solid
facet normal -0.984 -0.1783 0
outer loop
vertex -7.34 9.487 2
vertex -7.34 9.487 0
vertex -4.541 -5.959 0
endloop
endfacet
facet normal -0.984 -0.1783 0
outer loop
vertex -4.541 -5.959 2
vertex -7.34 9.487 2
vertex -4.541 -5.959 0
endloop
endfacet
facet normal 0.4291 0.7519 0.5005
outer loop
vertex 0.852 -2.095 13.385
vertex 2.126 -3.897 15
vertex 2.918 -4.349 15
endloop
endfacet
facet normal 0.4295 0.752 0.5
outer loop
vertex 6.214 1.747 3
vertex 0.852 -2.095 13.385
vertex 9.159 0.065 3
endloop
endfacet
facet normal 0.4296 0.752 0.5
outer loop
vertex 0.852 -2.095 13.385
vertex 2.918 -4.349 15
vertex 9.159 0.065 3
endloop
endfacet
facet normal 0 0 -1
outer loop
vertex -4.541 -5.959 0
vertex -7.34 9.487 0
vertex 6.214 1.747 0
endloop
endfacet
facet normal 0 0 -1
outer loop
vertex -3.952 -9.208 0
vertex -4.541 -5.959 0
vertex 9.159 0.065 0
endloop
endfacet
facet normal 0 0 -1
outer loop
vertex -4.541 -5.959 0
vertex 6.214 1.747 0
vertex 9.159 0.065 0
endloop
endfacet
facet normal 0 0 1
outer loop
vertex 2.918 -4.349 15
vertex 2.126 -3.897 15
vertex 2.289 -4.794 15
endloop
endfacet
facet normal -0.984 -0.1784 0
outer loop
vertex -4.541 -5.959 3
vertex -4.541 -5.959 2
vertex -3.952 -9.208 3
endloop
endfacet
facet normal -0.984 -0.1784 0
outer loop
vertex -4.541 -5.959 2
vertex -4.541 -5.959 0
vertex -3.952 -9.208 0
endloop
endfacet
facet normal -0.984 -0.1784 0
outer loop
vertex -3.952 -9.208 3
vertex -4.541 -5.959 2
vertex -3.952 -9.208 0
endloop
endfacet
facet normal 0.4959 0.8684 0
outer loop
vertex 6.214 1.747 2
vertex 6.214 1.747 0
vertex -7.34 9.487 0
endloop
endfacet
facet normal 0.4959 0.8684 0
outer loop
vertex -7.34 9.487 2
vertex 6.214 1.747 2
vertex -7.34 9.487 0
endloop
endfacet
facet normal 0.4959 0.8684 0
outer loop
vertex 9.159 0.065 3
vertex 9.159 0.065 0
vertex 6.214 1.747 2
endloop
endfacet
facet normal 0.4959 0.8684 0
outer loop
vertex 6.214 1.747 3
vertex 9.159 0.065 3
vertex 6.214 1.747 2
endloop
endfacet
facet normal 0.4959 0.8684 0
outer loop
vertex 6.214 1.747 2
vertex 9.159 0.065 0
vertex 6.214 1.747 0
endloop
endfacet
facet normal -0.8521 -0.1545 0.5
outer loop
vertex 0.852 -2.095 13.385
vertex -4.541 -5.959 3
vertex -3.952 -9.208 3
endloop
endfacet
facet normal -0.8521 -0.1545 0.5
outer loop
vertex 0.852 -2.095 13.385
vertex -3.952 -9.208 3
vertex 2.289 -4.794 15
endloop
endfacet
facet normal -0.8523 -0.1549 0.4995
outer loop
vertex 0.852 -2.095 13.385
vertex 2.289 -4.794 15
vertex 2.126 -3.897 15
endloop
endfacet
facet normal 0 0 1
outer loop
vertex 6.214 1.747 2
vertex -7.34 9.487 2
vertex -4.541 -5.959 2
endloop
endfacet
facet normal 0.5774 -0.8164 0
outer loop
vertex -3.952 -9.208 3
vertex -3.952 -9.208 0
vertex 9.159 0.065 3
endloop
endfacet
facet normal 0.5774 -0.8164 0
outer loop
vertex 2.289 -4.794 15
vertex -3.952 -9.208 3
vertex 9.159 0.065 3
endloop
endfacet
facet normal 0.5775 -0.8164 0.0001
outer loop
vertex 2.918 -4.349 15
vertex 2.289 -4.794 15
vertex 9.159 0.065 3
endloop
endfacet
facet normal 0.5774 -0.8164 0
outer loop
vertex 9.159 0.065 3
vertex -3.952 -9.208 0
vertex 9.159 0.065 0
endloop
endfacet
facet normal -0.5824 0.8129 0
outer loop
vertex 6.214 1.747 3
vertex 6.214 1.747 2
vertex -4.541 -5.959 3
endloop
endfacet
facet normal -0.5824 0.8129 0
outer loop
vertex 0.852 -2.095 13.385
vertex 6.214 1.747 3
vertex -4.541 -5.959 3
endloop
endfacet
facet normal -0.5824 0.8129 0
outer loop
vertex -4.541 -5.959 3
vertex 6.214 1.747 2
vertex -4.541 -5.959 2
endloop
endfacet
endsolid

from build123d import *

# Parameters (mm, degrees)
F1_DEPTH    = 2
F2_DEPTH    = 15
F3_T1_DEPTH = 65.3920789545
F3_T3_DEPTH = 65.4809656857


# Not quite as in the source:
# - a fillet or chamfer that OpenCascade refuses, or shapes differently, is made with other operations: its cross-section is extruded or revolved along the edge and cut away or added


with BuildPart() as f1:
    # F0 (on Top) → F1 (new body)
    with BuildSketch(Plane.XY):
        Polygon((6.2144221197, 1.7468538459), (-7.3403550955, 9.487123932), (-4.5410526356, -5.9592496019), align=None)
        Polygon((9.1590517926, 0.0653633566), (6.2144221197, 1.7468538459), (-4.5410526356, -5.9592496019), (-3.9522281139, -9.2083459887), align=None)
    extrude(amount=F1_DEPTH)

    # F0 (on Top) → F2 (join)
    with BuildSketch(Plane.XY):
        Polygon((9.1590517926, 0.0653633566), (6.2144221197, 1.7468538459), (-4.5410526356, -5.9592496019), (-3.9522281139, -9.2083459887), align=None)
    extrude(amount=F2_DEPTH)

    # F3: chamfer of 12 x 6.9282032303 on 2 edges, made by hand

    # F3_s2 → F3_t1 (cut)
    with BuildSketch(Plane(origin=(-4.6347910576, 25.5744832693, 0), x_dir=(0, 0, 1), z_dir=(0.1783224727, -0.9839721011, 0))):
        Polygon((3, 5.5309372275), (15, -1.3972660027), (15, 5.5309372275), align=None)
    extrude(amount=F3_T1_DEPTH, mode=Mode.SUBTRACT)

    # F3_s4 → F3_t3 (cut)
    with BuildSketch(Plane(origin=(33.8378902633, -19.3226642995, 0), x_dir=(0, 0, 1), z_dir=(-0.8683898362, 0.4958821356, 0))):
        Polygon((15, -2.3296321932), (3, 4.5985710371), (15, 4.5985710371), align=None)
    extrude(amount=F3_T3_DEPTH, mode=Mode.SUBTRACT)


solid = f1.part
